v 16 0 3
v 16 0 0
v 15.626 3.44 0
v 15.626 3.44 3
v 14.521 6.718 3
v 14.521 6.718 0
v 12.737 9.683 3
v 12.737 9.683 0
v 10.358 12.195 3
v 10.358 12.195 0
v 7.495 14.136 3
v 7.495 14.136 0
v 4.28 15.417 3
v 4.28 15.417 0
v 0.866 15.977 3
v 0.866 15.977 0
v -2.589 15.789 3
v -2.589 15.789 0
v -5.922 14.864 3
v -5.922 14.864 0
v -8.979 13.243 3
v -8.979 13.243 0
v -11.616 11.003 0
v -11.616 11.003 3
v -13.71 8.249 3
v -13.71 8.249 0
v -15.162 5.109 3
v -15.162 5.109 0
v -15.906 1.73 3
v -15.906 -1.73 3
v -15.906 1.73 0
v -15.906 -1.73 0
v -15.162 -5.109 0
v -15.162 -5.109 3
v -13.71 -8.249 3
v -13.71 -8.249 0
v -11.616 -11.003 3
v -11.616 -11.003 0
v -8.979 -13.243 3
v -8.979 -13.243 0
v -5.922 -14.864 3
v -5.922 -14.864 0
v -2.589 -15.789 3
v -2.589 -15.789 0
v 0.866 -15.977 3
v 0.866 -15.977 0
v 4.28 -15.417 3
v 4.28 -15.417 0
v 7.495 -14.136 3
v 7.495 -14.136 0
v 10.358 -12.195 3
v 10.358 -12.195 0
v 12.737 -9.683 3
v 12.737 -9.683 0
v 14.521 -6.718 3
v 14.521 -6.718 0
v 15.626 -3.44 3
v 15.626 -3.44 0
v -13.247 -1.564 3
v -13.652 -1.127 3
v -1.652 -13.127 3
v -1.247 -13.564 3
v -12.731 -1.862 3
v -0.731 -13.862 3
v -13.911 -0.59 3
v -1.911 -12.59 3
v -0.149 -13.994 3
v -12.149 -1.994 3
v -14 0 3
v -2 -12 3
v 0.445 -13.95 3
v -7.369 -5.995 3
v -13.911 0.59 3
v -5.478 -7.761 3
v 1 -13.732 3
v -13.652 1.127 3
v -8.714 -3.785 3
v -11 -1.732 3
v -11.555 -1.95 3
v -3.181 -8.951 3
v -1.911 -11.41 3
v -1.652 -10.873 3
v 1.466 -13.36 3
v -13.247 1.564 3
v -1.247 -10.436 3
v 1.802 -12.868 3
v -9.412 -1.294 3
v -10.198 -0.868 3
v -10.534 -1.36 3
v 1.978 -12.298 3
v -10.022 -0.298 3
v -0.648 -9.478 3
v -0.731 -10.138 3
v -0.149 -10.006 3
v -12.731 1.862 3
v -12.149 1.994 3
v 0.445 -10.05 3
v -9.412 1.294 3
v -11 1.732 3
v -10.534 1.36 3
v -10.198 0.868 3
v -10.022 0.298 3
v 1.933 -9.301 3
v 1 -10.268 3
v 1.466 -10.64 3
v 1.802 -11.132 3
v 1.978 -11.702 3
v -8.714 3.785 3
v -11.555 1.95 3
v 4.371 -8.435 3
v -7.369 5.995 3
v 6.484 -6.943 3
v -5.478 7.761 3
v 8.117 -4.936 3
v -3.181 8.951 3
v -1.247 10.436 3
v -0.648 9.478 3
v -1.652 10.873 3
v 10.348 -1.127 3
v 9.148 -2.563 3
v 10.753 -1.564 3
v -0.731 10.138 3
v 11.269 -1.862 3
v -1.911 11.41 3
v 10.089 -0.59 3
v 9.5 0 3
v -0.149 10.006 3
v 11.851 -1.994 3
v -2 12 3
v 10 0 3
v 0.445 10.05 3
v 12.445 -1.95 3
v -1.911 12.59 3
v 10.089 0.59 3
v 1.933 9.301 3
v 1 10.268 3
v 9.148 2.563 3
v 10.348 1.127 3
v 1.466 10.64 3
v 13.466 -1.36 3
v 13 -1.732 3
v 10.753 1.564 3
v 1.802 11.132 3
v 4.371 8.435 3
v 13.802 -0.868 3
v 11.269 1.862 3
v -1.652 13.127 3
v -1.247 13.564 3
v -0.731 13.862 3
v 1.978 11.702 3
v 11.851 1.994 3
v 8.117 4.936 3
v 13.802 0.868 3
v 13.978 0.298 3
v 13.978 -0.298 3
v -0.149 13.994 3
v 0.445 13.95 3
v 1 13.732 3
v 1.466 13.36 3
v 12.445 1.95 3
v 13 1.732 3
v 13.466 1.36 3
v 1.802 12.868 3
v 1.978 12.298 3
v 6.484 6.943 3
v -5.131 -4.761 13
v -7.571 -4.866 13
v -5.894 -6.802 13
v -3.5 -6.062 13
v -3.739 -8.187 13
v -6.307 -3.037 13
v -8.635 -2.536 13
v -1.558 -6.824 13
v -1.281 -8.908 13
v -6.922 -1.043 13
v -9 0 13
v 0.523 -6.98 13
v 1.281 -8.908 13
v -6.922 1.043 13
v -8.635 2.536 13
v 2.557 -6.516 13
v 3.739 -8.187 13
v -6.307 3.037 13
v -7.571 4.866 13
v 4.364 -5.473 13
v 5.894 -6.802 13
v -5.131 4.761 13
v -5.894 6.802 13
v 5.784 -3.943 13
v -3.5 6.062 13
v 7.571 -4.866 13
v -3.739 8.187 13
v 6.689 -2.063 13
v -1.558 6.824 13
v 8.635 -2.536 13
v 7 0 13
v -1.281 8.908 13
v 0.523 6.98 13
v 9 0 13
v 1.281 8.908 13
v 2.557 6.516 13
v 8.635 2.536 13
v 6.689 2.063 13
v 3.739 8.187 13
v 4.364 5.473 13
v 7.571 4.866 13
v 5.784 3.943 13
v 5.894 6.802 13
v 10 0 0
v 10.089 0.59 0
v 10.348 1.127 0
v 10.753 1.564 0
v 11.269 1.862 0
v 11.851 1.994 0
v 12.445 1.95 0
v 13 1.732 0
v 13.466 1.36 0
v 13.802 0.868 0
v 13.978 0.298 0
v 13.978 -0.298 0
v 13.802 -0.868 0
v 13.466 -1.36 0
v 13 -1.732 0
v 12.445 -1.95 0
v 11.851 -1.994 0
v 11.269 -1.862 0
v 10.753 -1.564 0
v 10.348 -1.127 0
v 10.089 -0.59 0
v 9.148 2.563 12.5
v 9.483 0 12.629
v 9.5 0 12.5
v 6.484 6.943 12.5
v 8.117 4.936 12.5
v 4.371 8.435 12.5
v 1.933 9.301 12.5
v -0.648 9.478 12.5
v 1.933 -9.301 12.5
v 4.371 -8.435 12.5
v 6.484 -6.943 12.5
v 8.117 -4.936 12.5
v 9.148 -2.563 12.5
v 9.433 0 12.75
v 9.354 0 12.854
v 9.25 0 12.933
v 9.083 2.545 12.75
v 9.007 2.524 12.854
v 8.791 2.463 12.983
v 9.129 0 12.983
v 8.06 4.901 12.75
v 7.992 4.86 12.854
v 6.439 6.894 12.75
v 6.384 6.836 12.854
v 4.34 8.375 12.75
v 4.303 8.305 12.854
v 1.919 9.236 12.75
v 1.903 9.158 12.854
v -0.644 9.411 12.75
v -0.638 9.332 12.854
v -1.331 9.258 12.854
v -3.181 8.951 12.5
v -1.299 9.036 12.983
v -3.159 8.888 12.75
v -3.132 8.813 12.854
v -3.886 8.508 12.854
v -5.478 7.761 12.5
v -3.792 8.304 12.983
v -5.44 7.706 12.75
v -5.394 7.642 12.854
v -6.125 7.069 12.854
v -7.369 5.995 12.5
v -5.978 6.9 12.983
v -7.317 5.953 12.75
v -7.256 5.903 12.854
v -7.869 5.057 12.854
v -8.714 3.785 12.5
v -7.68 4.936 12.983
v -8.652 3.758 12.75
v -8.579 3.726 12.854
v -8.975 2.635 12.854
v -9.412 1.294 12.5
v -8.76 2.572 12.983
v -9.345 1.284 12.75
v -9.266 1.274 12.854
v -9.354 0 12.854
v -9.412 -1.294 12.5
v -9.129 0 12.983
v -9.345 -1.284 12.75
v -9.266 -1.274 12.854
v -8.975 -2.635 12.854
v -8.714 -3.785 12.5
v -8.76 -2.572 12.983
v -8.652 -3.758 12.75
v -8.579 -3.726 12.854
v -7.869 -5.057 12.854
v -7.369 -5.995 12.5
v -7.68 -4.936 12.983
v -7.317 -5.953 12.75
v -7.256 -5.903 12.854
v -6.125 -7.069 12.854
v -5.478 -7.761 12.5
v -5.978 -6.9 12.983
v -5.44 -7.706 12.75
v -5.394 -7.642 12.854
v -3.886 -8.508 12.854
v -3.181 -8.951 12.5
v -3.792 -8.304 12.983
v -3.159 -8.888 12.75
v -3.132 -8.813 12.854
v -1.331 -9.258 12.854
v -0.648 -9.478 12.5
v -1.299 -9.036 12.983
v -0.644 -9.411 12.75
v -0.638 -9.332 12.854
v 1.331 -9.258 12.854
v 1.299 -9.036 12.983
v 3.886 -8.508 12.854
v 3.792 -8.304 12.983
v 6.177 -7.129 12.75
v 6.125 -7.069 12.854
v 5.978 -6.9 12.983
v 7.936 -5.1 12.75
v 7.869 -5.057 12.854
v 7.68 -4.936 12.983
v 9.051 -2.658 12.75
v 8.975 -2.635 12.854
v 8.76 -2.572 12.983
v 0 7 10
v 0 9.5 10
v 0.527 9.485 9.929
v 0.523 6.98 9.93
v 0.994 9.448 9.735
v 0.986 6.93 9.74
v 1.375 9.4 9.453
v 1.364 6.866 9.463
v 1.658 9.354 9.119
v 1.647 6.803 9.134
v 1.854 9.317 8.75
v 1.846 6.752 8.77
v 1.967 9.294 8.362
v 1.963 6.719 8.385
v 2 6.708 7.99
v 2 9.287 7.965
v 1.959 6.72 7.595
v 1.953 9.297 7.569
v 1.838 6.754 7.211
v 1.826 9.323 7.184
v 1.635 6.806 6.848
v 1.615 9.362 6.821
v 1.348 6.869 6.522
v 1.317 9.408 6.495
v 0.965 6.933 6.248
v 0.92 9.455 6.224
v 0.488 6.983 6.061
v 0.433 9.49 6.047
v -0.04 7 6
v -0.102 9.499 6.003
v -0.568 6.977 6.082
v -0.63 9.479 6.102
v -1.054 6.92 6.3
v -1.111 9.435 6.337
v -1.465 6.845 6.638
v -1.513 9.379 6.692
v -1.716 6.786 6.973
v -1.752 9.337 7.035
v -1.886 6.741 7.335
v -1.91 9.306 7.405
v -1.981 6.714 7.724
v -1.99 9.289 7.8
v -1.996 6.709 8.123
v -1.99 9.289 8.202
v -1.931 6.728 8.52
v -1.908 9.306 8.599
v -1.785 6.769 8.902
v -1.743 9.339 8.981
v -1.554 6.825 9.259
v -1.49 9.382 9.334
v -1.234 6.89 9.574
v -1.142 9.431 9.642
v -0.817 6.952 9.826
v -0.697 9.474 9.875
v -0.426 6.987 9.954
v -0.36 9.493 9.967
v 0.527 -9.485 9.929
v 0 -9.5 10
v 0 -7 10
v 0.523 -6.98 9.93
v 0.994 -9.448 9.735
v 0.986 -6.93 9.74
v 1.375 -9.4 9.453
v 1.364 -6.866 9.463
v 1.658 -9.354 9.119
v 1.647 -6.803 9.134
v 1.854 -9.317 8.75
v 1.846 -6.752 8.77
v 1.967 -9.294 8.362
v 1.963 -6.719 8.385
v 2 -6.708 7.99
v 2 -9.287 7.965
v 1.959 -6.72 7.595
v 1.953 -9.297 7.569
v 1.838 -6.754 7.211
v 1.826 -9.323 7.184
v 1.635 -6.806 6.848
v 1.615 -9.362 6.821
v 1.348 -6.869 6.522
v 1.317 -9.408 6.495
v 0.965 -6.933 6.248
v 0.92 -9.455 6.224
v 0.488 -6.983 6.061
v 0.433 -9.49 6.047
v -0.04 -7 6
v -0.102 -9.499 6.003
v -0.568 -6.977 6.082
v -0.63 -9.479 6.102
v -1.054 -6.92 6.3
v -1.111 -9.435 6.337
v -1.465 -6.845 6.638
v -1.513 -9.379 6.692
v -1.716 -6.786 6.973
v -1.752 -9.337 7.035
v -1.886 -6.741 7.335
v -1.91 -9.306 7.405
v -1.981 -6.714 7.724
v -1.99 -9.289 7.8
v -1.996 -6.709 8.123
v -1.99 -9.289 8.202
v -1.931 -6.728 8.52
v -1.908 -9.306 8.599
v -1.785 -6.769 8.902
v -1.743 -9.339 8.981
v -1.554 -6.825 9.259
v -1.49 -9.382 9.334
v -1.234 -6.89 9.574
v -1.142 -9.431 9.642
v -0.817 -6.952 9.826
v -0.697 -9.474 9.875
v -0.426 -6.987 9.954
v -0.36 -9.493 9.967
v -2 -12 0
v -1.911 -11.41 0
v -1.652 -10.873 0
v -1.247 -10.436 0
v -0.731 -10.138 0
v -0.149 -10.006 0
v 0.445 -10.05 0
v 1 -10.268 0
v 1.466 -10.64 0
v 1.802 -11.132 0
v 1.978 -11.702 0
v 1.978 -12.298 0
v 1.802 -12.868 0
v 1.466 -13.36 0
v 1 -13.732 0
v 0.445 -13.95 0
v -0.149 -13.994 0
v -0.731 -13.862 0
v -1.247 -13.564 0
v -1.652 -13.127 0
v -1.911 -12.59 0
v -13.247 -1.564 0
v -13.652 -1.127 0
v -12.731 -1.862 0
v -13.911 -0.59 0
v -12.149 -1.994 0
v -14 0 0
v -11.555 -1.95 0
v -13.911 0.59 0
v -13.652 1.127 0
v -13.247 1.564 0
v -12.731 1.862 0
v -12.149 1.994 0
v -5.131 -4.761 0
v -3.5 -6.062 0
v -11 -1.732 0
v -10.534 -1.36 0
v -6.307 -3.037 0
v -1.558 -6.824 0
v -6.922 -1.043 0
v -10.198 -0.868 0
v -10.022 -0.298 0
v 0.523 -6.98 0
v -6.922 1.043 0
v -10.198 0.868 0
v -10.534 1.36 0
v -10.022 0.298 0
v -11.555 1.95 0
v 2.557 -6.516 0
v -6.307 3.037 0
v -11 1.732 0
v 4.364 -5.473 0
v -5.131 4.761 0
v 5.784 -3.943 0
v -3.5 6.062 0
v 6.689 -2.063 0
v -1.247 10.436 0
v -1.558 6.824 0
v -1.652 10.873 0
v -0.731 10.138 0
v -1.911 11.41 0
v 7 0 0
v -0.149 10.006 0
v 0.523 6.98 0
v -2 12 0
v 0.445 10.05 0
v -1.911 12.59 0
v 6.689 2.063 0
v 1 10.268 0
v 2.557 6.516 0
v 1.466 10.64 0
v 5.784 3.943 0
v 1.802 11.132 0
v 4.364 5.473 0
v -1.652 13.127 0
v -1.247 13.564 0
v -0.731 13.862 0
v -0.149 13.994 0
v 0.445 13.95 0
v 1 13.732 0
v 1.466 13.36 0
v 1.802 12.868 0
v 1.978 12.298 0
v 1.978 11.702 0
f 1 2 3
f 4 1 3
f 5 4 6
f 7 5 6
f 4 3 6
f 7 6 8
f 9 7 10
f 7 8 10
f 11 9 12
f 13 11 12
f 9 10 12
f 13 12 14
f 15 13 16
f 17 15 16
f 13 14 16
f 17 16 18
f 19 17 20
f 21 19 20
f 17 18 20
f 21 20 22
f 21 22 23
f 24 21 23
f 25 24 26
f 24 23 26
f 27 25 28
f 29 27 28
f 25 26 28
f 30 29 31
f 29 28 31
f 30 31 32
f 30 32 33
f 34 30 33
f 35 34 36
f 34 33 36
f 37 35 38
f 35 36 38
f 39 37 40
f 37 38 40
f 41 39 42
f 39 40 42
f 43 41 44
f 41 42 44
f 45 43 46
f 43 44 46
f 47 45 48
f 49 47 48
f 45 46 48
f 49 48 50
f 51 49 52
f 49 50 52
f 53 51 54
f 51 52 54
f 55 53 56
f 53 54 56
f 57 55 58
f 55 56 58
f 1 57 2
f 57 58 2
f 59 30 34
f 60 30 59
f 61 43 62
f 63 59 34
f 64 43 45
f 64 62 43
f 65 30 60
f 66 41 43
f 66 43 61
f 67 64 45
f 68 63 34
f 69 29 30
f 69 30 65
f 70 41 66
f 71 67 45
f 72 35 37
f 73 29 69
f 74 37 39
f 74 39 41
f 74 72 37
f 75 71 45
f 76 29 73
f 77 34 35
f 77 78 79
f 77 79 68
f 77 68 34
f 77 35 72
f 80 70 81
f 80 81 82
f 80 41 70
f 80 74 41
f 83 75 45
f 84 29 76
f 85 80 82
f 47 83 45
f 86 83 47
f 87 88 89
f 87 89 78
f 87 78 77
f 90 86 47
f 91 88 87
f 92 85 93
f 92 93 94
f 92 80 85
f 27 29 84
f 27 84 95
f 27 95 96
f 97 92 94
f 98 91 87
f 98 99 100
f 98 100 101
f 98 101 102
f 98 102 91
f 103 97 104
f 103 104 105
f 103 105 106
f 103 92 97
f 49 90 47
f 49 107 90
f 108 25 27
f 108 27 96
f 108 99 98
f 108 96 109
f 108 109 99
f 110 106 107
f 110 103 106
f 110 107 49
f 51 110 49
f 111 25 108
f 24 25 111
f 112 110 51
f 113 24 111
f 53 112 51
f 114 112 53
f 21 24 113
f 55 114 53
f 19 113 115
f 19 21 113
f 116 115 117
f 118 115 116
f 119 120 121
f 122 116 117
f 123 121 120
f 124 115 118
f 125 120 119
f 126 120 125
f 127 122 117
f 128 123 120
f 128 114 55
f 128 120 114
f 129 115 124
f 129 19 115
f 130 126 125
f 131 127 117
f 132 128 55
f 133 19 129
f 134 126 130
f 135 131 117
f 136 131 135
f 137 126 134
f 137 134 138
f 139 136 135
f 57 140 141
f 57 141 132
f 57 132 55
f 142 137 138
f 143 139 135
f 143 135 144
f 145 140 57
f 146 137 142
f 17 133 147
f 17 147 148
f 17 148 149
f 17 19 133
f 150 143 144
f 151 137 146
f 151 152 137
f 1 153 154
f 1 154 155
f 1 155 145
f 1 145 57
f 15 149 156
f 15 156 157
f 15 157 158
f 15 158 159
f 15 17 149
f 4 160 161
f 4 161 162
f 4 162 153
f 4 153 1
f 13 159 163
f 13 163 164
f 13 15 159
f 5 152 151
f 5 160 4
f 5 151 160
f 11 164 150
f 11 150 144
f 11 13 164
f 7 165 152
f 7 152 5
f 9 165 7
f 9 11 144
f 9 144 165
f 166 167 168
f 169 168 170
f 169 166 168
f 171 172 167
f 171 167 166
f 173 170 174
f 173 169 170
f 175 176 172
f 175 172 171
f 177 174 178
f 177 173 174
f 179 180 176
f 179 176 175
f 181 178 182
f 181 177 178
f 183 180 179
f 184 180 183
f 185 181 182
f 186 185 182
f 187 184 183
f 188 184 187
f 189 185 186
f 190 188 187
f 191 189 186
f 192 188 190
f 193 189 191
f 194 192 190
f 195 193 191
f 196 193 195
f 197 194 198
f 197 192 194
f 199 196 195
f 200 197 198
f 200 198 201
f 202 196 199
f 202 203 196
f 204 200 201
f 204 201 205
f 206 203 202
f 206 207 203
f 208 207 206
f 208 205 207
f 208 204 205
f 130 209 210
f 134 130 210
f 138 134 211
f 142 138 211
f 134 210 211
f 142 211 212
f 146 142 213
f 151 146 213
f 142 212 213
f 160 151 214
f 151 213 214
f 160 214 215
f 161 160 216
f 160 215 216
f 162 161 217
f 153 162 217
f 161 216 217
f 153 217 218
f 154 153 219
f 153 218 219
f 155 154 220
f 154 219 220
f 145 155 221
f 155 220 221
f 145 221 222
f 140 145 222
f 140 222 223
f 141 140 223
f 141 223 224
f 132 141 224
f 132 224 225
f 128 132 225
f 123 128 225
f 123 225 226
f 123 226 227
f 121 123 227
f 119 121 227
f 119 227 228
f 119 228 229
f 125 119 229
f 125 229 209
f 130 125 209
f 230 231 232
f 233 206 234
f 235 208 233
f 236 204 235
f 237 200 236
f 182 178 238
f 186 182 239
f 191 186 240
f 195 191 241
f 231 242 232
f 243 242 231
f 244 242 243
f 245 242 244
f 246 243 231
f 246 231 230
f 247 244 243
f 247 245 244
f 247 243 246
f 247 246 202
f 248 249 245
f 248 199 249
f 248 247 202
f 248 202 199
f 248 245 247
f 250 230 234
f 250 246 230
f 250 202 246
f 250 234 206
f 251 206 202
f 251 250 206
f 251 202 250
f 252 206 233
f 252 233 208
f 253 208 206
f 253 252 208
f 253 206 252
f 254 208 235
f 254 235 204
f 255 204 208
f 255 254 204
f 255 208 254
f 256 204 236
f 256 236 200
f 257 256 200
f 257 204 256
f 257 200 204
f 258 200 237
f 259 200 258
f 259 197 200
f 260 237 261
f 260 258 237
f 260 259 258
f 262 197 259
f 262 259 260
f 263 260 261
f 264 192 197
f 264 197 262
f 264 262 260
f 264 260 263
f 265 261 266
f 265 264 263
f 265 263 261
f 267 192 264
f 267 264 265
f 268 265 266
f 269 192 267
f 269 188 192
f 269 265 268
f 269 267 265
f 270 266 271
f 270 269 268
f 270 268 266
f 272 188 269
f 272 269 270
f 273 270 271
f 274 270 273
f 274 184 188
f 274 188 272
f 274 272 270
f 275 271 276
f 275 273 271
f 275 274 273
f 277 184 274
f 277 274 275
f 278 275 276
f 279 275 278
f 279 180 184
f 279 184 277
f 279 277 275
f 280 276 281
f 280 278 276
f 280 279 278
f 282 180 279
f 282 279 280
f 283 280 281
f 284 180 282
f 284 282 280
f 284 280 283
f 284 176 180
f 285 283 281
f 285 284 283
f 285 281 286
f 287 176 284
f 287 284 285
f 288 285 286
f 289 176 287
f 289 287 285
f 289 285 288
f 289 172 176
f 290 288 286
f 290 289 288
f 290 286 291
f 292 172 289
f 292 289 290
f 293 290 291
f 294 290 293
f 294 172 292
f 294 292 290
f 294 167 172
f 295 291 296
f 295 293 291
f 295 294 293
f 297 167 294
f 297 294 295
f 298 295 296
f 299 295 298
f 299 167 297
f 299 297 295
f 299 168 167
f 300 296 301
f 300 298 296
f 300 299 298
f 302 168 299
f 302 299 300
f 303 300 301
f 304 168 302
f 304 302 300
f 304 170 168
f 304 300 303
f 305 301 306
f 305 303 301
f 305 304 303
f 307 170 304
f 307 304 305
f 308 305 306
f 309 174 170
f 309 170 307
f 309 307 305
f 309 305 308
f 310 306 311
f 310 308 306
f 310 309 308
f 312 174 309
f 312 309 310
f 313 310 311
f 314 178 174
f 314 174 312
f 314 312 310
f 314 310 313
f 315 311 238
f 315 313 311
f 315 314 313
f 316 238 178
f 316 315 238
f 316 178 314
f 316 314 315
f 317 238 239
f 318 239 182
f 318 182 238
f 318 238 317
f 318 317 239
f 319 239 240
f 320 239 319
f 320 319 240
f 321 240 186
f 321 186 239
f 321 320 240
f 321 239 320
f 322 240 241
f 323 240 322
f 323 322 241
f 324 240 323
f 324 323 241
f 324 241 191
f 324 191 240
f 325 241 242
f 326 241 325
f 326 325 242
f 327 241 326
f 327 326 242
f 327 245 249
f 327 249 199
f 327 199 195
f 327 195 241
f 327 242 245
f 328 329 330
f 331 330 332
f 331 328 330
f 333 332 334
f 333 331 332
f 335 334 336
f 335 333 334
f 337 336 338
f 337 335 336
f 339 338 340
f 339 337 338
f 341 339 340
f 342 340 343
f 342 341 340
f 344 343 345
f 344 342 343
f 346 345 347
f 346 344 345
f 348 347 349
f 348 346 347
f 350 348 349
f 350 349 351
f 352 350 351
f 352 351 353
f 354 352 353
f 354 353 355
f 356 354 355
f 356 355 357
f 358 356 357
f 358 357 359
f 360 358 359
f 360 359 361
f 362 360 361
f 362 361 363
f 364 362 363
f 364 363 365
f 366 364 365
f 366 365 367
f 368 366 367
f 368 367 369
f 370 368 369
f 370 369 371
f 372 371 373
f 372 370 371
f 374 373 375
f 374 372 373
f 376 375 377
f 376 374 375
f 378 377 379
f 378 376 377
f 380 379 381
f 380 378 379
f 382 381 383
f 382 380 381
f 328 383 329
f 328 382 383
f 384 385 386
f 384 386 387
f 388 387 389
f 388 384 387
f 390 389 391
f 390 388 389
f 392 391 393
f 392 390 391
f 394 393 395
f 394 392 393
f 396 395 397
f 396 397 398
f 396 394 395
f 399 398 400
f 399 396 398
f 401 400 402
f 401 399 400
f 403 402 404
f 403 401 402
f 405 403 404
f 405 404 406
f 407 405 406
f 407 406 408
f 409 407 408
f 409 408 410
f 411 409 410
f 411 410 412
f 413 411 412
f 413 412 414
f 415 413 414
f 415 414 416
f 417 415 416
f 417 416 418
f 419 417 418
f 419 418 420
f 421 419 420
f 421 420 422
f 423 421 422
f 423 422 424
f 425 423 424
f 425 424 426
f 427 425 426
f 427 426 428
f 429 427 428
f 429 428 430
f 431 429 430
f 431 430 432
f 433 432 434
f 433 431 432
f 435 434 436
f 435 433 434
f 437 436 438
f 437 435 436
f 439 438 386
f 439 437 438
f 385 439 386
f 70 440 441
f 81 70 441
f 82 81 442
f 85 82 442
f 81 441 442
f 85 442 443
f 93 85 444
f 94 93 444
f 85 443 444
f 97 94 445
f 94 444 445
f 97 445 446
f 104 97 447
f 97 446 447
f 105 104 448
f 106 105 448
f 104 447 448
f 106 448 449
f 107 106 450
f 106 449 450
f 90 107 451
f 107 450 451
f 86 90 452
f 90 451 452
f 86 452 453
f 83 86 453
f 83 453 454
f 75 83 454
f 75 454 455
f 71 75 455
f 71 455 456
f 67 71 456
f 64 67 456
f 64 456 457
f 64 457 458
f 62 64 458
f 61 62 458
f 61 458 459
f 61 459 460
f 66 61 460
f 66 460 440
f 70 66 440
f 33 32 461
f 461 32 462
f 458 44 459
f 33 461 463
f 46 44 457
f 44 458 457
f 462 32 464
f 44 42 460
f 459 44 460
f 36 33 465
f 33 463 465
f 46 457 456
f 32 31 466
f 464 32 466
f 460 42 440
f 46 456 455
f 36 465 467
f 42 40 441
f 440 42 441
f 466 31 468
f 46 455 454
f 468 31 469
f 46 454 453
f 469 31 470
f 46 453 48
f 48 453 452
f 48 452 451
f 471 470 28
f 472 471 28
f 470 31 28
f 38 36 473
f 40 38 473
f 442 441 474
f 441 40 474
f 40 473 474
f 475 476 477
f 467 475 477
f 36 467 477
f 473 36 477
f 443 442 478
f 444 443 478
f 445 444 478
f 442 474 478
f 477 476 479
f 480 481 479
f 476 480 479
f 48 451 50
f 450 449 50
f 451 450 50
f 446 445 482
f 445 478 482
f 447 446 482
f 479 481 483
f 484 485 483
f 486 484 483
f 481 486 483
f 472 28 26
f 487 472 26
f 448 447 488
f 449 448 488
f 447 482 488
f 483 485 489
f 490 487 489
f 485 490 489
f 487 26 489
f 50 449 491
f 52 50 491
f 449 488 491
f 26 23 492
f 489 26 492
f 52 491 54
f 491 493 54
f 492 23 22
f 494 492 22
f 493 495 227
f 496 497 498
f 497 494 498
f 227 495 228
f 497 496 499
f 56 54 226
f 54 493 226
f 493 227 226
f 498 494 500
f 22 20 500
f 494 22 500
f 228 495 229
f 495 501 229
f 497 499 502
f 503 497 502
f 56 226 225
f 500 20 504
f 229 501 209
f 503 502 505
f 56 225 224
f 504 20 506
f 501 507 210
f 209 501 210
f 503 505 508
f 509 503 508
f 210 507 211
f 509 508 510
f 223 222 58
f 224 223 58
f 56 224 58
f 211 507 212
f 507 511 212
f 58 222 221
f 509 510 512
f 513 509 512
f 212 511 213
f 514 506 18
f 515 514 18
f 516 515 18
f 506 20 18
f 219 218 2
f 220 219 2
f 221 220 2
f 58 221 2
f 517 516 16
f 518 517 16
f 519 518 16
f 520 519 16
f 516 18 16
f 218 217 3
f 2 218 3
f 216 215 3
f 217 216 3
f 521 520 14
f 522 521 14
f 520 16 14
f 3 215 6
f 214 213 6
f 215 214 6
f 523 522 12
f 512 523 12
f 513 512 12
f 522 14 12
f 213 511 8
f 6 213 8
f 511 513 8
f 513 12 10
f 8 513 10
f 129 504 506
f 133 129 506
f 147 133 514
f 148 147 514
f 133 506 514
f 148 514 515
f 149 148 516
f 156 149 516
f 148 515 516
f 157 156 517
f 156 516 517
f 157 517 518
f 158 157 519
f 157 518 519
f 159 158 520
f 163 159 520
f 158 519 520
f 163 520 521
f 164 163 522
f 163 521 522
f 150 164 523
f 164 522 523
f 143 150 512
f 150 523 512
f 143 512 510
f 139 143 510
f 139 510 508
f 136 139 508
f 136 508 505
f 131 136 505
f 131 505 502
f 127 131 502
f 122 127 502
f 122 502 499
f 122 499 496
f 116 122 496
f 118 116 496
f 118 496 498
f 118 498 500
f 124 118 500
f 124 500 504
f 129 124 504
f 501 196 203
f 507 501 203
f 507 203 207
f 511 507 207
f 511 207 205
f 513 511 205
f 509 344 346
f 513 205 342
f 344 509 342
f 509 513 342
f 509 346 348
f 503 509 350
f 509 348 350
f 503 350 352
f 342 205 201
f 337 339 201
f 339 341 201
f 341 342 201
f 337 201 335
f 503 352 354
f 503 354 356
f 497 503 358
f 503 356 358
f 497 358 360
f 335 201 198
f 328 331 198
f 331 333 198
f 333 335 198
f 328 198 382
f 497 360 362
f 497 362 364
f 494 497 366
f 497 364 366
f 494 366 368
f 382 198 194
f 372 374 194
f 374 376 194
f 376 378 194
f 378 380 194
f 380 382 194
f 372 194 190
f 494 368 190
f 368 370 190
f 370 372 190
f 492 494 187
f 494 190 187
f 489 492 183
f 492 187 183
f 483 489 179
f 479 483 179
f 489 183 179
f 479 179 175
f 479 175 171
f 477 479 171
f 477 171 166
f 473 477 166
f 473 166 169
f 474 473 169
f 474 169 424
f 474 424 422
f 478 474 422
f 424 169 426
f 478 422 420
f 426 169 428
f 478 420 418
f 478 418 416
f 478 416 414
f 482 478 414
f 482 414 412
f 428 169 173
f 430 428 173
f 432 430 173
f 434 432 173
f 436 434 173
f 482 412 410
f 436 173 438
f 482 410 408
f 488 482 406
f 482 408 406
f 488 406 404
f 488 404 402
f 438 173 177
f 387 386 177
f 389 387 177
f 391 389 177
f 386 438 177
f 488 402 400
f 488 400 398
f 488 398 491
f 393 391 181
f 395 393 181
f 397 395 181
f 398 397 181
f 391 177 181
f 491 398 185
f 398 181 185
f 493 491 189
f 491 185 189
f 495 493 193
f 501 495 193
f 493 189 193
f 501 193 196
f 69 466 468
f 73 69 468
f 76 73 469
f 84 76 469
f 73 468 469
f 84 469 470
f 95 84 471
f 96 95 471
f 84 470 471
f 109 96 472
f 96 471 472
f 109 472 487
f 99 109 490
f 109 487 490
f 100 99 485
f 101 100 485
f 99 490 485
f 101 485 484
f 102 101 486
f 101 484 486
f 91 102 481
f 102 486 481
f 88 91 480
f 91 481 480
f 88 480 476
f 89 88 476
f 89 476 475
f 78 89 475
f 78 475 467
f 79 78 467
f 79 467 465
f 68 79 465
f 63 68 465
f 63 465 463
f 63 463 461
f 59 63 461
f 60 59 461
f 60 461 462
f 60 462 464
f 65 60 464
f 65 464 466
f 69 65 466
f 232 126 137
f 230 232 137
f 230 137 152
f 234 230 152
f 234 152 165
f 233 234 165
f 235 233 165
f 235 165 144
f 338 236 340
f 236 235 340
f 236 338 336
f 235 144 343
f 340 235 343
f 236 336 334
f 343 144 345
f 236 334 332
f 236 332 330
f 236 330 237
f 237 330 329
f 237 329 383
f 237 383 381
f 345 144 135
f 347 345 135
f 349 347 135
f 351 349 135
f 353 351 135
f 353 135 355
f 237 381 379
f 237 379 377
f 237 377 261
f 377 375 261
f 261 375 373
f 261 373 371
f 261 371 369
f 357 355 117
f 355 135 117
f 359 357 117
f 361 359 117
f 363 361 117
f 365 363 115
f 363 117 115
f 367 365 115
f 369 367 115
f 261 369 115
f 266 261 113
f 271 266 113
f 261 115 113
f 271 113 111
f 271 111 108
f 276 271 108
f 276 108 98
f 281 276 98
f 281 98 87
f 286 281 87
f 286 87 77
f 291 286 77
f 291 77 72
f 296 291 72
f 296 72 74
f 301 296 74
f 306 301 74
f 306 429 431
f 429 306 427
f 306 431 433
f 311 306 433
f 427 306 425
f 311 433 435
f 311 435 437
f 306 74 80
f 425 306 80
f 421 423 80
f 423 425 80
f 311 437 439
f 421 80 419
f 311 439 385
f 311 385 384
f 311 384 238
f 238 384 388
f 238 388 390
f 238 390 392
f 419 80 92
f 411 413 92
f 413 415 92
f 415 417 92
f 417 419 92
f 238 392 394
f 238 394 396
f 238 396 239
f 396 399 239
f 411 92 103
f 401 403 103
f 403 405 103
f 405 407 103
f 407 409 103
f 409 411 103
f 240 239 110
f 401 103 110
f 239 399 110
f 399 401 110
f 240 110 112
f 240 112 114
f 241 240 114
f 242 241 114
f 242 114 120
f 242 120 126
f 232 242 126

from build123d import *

# Parameters (mm, degrees)
SKETCH5_R               = 16
BOSS_EXTRUDE3_DEPTH     = 3
SKETCH6_R               = 9.5
BOSS_EXTRUDE4_DEPTH     = 10
SKETCH7_R               = 7
CUT_EXTRUDE1_DEPTH      = 27.095976701
SKETCH8_R               = 2
CUT_EXTRUDE2_DEPTH      = 27.095976701
CUT_EXTRUDE4_DEPTH      = 27.095976701
CUT_EXTRUDE4_DEPTH_BACK = 27.095976701
SKETCH9_R               = 2
FILLET1_R               = 0.5


with BuildPart() as part:
    # Sketch5 → Boss-Extrude3 (new body)
    with BuildSketch(Plane.XY):
        Circle(SKETCH5_R)
    extrude(amount=BOSS_EXTRUDE3_DEPTH)

    # Sketch6 → Boss-Extrude4 (add)
    with BuildSketch(Plane.XY.offset(3)):
        Circle(SKETCH6_R)
    extrude(amount=BOSS_EXTRUDE4_DEPTH)

    # Sketch7 → Cut-Extrude1 (cut, through all)
    with BuildSketch(Plane.XY.offset(13)):
        Circle(SKETCH7_R)
    extrude(amount=-CUT_EXTRUDE1_DEPTH, mode=Mode.SUBTRACT)

    # Sketch8 → Cut-Extrude2 (cut, through all)
    with BuildSketch(Plane(origin=(0, 0, 0), x_dir=(-1, 0, 0), z_dir=(0, 0, -1))):
        with Locations((12, 0)):
            Circle(SKETCH8_R)
        with Locations((0, -12)):
            Circle(SKETCH8_R)
        with Locations((-12, 0)):
            Circle(SKETCH8_R)
        with Locations((0, 12)):
            Circle(SKETCH8_R)
    extrude(amount=-CUT_EXTRUDE2_DEPTH, mode=Mode.SUBTRACT)

    # Sketch9 → Cut-Extrude4 (cut, two sides: drawn at the far end of the back side and taken through both)
    with BuildSketch(Plane(origin=(0, 0, 0), x_dir=(1, 0, 0), z_dir=(0, 1, 0)).offset(-CUT_EXTRUDE4_DEPTH_BACK)):
        with Locations(Location((0, -8, 0), (0, 0, 270))):
            Circle(SKETCH9_R)
    extrude(amount=CUT_EXTRUDE4_DEPTH + CUT_EXTRUDE4_DEPTH_BACK, mode=Mode.SUBTRACT)

    # Fillet1
    fillet1_edges = [part.edges().sort_by_distance(p)[0] for p in [
        (-9.5, 0, 13),
    ]]
    fillet(fillet1_edges, radius=FILLET1_R)


solid = part.part
